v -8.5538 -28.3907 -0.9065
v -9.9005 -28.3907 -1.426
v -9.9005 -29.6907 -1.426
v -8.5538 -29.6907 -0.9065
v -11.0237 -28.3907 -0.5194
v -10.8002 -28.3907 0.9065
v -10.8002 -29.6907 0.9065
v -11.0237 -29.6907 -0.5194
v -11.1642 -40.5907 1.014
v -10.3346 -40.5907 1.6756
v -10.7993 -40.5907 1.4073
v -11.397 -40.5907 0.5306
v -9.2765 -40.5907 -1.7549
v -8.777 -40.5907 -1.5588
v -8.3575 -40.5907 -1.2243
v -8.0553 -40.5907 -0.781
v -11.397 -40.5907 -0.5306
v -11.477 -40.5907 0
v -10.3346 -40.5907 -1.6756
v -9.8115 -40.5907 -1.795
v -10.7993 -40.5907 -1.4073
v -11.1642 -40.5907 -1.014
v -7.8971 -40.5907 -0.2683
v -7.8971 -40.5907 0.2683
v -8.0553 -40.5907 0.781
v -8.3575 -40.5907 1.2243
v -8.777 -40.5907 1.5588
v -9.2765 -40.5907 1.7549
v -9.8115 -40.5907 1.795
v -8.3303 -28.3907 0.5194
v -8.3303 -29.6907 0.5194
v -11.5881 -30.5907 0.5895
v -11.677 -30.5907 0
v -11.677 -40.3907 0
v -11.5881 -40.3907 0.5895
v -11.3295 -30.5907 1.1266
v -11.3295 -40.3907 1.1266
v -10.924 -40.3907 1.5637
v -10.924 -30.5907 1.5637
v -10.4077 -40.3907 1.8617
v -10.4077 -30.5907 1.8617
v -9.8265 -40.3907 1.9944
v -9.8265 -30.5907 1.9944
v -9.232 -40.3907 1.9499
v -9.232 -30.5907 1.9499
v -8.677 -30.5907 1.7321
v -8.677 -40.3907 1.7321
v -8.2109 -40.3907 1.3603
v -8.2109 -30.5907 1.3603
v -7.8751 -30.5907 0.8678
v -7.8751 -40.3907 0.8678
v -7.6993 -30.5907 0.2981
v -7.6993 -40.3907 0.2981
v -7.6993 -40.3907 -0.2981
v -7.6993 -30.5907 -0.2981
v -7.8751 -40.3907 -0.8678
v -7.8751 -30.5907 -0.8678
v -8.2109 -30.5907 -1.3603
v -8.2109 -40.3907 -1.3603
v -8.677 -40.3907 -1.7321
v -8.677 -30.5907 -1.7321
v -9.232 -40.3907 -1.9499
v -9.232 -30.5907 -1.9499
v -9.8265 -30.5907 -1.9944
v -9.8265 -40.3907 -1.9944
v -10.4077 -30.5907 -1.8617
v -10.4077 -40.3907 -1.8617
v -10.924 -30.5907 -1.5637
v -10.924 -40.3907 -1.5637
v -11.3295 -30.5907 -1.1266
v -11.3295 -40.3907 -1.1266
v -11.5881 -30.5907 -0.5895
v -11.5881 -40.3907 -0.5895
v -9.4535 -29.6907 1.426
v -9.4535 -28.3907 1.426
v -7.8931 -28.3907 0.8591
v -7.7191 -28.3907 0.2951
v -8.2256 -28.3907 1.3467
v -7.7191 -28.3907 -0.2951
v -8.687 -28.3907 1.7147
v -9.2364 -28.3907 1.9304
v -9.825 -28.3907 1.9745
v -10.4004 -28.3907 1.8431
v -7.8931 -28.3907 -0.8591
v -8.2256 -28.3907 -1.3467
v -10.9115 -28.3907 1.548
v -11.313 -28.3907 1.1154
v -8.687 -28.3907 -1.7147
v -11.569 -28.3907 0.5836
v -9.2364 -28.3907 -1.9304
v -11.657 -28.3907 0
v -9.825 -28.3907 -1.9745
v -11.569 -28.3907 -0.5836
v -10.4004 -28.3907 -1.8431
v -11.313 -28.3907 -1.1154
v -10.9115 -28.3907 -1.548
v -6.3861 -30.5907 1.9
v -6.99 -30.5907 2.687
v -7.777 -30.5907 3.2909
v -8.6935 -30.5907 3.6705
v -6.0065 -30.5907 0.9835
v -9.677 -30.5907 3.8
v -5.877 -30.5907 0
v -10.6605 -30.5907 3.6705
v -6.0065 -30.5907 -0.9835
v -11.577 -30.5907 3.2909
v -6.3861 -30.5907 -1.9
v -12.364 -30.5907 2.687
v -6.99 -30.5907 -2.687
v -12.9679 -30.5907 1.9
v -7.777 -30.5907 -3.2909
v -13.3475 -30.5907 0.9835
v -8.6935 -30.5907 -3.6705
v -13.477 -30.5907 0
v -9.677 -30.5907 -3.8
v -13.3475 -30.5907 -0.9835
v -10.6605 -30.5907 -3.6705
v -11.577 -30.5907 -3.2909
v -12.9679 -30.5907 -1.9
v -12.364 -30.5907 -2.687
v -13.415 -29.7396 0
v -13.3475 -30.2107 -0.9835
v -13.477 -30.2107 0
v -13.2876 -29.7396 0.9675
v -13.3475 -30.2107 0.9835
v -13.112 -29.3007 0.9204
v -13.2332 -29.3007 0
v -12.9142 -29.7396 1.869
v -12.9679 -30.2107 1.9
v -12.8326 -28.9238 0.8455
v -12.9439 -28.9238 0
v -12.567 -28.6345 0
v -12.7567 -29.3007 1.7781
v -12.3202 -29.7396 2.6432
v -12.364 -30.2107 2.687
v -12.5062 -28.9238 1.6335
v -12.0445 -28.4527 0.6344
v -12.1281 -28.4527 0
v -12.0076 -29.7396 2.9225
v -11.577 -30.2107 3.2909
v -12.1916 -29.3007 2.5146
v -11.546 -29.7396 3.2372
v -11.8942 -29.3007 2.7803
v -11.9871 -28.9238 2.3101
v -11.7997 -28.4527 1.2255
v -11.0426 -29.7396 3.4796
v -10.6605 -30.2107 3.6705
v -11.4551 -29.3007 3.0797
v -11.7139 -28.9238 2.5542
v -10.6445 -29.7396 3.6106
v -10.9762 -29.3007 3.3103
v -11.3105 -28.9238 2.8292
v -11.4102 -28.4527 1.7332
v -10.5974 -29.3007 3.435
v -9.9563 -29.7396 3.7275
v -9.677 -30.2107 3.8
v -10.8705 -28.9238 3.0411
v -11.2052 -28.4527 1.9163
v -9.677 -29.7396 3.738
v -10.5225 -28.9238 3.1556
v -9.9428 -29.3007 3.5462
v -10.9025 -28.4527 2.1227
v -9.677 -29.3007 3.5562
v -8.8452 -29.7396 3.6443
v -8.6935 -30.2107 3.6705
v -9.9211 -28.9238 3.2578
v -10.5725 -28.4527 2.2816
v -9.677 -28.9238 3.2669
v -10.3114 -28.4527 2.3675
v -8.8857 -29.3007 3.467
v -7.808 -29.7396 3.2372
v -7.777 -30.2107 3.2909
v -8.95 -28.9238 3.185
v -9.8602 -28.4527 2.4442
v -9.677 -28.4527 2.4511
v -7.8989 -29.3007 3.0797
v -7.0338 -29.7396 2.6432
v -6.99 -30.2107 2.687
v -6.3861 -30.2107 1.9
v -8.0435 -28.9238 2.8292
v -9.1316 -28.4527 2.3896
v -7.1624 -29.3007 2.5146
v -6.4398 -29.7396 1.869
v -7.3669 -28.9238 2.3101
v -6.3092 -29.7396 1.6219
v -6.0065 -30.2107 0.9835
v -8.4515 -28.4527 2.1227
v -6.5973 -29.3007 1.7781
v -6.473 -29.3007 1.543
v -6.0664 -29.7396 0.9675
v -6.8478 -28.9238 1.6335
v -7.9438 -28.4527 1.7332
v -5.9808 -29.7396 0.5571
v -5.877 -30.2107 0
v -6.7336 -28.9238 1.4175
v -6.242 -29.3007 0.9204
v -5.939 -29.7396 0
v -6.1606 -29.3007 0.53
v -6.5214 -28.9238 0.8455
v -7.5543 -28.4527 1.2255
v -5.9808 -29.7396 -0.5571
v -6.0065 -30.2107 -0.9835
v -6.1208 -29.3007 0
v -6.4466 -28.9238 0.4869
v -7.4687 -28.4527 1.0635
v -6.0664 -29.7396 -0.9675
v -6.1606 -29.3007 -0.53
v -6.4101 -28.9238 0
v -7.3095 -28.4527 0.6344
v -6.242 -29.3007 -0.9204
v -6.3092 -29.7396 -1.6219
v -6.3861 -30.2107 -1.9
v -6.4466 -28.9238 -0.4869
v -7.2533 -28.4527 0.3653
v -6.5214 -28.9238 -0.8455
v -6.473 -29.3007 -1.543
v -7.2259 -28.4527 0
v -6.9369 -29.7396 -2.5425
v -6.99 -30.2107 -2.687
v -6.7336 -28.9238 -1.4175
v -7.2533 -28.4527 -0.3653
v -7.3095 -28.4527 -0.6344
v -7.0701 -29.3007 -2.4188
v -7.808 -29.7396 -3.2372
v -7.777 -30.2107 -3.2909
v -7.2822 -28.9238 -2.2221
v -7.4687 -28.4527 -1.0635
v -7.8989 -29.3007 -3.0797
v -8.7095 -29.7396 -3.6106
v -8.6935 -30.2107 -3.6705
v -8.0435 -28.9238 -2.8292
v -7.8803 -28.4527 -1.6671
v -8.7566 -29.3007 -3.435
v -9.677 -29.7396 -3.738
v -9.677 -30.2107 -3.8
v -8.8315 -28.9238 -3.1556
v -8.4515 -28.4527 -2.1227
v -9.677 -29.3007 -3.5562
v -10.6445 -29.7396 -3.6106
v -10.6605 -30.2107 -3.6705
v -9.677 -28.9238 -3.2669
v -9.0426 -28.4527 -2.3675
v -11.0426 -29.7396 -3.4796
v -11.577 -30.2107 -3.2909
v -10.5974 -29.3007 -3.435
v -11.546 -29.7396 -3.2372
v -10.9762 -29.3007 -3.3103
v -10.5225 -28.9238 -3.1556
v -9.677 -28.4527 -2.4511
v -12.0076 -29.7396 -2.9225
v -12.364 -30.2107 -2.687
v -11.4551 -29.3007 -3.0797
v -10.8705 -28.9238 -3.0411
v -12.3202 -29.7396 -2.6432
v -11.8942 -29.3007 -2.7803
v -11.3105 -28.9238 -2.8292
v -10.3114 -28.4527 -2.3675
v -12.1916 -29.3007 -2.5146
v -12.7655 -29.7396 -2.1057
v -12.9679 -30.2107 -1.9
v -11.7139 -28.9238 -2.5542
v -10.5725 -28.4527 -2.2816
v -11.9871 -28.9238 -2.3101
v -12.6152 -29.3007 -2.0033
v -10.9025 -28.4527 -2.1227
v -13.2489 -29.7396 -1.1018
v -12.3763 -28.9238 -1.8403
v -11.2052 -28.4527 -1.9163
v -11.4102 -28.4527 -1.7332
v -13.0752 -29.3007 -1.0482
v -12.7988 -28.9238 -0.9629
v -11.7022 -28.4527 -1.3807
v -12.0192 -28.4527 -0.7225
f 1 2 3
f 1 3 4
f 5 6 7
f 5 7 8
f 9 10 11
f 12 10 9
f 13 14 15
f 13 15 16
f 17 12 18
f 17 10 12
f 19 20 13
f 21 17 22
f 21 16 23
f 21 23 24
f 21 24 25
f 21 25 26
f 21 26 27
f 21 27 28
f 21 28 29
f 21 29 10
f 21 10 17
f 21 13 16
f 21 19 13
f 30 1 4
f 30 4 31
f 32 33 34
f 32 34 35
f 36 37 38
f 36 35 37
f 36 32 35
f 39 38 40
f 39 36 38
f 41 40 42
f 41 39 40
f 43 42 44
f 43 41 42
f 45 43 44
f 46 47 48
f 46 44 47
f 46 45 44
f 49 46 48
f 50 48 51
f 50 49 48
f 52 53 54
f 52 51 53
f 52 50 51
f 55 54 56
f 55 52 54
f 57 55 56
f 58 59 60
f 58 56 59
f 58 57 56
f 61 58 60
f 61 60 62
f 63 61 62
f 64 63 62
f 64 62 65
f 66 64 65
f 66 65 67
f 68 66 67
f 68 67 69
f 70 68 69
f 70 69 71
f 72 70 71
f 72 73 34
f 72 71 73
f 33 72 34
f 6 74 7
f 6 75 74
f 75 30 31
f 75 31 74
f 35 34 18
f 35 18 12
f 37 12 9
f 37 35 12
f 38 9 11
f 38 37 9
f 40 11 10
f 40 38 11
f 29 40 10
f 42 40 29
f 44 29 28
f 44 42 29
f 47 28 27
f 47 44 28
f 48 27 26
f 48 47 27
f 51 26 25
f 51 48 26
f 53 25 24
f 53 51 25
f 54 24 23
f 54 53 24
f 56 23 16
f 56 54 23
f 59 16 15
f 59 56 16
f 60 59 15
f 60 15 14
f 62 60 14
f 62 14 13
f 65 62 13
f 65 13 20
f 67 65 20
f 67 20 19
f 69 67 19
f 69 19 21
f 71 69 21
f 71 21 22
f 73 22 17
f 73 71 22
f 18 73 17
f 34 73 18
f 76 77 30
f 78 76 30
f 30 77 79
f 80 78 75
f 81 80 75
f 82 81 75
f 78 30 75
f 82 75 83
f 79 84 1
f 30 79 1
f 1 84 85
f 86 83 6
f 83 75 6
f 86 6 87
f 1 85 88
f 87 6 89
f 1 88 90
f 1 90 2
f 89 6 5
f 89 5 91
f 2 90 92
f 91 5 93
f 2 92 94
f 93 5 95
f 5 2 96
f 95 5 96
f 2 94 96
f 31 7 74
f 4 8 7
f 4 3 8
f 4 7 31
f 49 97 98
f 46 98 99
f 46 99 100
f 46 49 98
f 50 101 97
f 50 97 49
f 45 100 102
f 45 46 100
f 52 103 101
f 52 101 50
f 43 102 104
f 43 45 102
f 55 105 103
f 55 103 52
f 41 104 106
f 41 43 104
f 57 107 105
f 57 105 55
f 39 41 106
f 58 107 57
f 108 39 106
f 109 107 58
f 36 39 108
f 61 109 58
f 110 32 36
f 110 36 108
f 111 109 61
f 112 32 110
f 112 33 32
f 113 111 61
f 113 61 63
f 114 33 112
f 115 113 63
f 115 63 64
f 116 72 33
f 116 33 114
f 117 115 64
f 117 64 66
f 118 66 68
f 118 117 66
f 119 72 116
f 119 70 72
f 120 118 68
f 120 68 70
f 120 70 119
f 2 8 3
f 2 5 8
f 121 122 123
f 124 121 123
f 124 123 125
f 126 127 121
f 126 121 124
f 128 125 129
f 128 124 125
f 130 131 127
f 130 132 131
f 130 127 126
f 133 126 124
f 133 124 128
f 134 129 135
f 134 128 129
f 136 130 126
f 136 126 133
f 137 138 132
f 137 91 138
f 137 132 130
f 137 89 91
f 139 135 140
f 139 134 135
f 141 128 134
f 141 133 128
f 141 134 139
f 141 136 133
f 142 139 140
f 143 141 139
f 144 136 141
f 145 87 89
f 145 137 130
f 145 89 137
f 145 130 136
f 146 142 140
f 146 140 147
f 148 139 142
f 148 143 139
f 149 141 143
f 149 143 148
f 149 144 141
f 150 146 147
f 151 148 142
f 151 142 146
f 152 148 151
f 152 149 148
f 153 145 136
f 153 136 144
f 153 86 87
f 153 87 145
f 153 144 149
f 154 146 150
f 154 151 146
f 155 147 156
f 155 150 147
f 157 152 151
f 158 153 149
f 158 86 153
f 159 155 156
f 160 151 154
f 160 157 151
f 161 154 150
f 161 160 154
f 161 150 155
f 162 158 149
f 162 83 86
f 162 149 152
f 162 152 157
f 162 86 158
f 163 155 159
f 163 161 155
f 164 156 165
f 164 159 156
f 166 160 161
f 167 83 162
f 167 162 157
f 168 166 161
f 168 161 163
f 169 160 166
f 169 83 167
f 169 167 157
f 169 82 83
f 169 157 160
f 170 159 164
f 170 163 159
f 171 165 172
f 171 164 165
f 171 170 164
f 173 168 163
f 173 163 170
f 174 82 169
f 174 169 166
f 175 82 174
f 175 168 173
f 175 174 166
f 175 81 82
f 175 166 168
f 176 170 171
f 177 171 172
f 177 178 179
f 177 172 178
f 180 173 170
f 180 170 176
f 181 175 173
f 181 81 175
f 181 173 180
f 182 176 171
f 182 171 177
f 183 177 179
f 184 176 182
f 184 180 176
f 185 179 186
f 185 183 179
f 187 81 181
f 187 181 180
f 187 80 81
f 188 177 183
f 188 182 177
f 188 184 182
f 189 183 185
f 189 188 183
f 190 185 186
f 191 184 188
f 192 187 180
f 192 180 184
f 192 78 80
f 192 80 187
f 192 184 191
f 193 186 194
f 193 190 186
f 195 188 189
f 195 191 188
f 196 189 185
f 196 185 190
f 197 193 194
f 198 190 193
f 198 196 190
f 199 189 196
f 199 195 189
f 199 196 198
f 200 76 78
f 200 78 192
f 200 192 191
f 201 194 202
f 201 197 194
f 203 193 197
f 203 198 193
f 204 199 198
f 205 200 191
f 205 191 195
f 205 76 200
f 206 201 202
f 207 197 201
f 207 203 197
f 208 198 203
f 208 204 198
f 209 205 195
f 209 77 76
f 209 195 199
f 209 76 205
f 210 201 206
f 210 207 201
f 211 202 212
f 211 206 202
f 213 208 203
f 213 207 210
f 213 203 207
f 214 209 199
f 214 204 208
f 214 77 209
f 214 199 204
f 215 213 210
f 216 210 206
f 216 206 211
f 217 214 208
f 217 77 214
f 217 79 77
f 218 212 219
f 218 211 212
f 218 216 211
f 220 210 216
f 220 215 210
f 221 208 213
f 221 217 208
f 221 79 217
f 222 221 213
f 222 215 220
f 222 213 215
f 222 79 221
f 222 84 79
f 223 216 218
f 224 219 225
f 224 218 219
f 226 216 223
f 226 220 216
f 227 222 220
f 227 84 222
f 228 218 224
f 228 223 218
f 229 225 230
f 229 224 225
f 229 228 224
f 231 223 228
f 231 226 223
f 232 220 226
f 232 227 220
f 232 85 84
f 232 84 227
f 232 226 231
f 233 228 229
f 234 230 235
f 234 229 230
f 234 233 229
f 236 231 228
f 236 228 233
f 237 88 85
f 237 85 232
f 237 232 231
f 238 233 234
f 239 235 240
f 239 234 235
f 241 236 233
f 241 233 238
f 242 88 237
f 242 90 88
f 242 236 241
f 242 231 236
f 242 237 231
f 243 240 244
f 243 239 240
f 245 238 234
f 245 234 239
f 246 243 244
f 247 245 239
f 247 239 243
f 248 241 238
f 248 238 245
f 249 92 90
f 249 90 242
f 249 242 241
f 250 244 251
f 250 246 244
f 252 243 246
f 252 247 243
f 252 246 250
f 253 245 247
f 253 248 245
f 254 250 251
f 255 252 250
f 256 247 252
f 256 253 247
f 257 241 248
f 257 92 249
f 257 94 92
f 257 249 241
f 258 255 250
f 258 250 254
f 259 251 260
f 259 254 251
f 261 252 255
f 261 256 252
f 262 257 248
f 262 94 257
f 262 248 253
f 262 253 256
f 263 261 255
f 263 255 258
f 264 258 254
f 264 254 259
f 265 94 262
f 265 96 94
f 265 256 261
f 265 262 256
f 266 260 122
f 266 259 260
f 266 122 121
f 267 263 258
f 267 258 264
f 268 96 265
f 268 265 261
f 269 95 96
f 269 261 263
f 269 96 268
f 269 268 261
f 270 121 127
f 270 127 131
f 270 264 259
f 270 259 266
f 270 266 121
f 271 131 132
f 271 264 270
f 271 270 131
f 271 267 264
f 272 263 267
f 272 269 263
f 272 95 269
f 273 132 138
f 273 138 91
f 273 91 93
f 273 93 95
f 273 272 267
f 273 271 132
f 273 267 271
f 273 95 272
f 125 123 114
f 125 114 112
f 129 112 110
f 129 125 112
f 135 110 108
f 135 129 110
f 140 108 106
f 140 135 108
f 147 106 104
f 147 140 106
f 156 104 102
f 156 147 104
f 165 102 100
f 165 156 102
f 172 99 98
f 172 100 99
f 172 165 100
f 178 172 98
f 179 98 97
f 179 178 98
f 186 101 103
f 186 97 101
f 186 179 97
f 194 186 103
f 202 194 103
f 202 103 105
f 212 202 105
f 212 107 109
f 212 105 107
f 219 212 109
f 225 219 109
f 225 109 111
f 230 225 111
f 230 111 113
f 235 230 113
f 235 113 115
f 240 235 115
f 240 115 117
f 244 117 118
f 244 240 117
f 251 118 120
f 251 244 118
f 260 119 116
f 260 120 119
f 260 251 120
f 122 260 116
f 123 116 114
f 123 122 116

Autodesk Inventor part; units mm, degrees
ref_plane "YZ Plane" through (0, 0, 0) normal (1, 0, 0) x (0, 1, 0)
ref_plane "XZ Plane" through (0, 0, 0) normal (0, 1, 0) x (-1, 0, 0)
ref_plane "XY Plane" through (0, 0, 0) normal (0, 0, 1) x (1, 0, 0)
sketch "Sketch1" plane through (0, 0, 0) normal (0, 0, 1) x (1, 0, 0)
  line L0 (-9.677, -30.5907) -> (-13.477, -30.5907)
  line L1 (-9.677, -30.5907) -> (-9.677, -40.5907)
  line L2 (-9.677, -40.5907) -> (-11.677, -40.5907)
  line L3 (-11.677, -40.5907) -> (-11.677, -30.5907)
  line L4 (-9.677, -30.5907) -> (-9.677, -26.5988)
  line L5 (-13.477, -30.5907) -> (-13.477, -30.2107)
  line L6 (-13.477, -30.2107) -> (-13.477, -28.3907)
  line L7 (-13.477, -28.3907) -> (-9.677, -28.3907)
  point P0 (0, 0)
  dimension "d0" = 3.8
  dimension "d2" = 10
  dimension "d3" = 2
  dimension "d18" = 0.38
  dimension "d19" = 2.2
revolve "Revolution1" add sketch "Sketch1" angle 360 about axis through (-9.677, -30.5907, 0) along (0, -1, 0)
chamfer "Chamfer2" distance 0.2 angle 45 1 edges at (-7.677, -40.5907, 0)
thread "Rosca1" size "M4x0.7" class "6g" standard "ANSI Metric M Profile" full length
fillet "Empalme2" radius 1.82 1 edges at (-5.877, -28.3907, 0)
sketch "Boceto2" plane through (-9.677, -28.3907, 0) normal (0, 1, 0) x (1, 0, 0)
  line L0 (1.1232, 0.9065) -> (1.3467, -0.5194)
  line L1 (1.3467, -0.5194) -> (0.2235, -1.426)
  line L2 (0.2235, -1.426) -> (-1.1232, -0.9065)
  line L3 (-1.1232, -0.9065) -> (-1.3467, 0.5194)
  line L4 (-1.3467, 0.5194) -> (-0.2235, 1.426)
  line L5 (-0.2235, 1.426) -> (1.1232, 0.9065)
  point P0 (9.677, 0)
  point P1 (0, 0)
  dimension "d21" = 2.5
extrude "Extrusión1" cut sketch "Boceto2" against normal blind 1.3
properties part number "Tornillo Allen cabeza botón M4x10mm"
